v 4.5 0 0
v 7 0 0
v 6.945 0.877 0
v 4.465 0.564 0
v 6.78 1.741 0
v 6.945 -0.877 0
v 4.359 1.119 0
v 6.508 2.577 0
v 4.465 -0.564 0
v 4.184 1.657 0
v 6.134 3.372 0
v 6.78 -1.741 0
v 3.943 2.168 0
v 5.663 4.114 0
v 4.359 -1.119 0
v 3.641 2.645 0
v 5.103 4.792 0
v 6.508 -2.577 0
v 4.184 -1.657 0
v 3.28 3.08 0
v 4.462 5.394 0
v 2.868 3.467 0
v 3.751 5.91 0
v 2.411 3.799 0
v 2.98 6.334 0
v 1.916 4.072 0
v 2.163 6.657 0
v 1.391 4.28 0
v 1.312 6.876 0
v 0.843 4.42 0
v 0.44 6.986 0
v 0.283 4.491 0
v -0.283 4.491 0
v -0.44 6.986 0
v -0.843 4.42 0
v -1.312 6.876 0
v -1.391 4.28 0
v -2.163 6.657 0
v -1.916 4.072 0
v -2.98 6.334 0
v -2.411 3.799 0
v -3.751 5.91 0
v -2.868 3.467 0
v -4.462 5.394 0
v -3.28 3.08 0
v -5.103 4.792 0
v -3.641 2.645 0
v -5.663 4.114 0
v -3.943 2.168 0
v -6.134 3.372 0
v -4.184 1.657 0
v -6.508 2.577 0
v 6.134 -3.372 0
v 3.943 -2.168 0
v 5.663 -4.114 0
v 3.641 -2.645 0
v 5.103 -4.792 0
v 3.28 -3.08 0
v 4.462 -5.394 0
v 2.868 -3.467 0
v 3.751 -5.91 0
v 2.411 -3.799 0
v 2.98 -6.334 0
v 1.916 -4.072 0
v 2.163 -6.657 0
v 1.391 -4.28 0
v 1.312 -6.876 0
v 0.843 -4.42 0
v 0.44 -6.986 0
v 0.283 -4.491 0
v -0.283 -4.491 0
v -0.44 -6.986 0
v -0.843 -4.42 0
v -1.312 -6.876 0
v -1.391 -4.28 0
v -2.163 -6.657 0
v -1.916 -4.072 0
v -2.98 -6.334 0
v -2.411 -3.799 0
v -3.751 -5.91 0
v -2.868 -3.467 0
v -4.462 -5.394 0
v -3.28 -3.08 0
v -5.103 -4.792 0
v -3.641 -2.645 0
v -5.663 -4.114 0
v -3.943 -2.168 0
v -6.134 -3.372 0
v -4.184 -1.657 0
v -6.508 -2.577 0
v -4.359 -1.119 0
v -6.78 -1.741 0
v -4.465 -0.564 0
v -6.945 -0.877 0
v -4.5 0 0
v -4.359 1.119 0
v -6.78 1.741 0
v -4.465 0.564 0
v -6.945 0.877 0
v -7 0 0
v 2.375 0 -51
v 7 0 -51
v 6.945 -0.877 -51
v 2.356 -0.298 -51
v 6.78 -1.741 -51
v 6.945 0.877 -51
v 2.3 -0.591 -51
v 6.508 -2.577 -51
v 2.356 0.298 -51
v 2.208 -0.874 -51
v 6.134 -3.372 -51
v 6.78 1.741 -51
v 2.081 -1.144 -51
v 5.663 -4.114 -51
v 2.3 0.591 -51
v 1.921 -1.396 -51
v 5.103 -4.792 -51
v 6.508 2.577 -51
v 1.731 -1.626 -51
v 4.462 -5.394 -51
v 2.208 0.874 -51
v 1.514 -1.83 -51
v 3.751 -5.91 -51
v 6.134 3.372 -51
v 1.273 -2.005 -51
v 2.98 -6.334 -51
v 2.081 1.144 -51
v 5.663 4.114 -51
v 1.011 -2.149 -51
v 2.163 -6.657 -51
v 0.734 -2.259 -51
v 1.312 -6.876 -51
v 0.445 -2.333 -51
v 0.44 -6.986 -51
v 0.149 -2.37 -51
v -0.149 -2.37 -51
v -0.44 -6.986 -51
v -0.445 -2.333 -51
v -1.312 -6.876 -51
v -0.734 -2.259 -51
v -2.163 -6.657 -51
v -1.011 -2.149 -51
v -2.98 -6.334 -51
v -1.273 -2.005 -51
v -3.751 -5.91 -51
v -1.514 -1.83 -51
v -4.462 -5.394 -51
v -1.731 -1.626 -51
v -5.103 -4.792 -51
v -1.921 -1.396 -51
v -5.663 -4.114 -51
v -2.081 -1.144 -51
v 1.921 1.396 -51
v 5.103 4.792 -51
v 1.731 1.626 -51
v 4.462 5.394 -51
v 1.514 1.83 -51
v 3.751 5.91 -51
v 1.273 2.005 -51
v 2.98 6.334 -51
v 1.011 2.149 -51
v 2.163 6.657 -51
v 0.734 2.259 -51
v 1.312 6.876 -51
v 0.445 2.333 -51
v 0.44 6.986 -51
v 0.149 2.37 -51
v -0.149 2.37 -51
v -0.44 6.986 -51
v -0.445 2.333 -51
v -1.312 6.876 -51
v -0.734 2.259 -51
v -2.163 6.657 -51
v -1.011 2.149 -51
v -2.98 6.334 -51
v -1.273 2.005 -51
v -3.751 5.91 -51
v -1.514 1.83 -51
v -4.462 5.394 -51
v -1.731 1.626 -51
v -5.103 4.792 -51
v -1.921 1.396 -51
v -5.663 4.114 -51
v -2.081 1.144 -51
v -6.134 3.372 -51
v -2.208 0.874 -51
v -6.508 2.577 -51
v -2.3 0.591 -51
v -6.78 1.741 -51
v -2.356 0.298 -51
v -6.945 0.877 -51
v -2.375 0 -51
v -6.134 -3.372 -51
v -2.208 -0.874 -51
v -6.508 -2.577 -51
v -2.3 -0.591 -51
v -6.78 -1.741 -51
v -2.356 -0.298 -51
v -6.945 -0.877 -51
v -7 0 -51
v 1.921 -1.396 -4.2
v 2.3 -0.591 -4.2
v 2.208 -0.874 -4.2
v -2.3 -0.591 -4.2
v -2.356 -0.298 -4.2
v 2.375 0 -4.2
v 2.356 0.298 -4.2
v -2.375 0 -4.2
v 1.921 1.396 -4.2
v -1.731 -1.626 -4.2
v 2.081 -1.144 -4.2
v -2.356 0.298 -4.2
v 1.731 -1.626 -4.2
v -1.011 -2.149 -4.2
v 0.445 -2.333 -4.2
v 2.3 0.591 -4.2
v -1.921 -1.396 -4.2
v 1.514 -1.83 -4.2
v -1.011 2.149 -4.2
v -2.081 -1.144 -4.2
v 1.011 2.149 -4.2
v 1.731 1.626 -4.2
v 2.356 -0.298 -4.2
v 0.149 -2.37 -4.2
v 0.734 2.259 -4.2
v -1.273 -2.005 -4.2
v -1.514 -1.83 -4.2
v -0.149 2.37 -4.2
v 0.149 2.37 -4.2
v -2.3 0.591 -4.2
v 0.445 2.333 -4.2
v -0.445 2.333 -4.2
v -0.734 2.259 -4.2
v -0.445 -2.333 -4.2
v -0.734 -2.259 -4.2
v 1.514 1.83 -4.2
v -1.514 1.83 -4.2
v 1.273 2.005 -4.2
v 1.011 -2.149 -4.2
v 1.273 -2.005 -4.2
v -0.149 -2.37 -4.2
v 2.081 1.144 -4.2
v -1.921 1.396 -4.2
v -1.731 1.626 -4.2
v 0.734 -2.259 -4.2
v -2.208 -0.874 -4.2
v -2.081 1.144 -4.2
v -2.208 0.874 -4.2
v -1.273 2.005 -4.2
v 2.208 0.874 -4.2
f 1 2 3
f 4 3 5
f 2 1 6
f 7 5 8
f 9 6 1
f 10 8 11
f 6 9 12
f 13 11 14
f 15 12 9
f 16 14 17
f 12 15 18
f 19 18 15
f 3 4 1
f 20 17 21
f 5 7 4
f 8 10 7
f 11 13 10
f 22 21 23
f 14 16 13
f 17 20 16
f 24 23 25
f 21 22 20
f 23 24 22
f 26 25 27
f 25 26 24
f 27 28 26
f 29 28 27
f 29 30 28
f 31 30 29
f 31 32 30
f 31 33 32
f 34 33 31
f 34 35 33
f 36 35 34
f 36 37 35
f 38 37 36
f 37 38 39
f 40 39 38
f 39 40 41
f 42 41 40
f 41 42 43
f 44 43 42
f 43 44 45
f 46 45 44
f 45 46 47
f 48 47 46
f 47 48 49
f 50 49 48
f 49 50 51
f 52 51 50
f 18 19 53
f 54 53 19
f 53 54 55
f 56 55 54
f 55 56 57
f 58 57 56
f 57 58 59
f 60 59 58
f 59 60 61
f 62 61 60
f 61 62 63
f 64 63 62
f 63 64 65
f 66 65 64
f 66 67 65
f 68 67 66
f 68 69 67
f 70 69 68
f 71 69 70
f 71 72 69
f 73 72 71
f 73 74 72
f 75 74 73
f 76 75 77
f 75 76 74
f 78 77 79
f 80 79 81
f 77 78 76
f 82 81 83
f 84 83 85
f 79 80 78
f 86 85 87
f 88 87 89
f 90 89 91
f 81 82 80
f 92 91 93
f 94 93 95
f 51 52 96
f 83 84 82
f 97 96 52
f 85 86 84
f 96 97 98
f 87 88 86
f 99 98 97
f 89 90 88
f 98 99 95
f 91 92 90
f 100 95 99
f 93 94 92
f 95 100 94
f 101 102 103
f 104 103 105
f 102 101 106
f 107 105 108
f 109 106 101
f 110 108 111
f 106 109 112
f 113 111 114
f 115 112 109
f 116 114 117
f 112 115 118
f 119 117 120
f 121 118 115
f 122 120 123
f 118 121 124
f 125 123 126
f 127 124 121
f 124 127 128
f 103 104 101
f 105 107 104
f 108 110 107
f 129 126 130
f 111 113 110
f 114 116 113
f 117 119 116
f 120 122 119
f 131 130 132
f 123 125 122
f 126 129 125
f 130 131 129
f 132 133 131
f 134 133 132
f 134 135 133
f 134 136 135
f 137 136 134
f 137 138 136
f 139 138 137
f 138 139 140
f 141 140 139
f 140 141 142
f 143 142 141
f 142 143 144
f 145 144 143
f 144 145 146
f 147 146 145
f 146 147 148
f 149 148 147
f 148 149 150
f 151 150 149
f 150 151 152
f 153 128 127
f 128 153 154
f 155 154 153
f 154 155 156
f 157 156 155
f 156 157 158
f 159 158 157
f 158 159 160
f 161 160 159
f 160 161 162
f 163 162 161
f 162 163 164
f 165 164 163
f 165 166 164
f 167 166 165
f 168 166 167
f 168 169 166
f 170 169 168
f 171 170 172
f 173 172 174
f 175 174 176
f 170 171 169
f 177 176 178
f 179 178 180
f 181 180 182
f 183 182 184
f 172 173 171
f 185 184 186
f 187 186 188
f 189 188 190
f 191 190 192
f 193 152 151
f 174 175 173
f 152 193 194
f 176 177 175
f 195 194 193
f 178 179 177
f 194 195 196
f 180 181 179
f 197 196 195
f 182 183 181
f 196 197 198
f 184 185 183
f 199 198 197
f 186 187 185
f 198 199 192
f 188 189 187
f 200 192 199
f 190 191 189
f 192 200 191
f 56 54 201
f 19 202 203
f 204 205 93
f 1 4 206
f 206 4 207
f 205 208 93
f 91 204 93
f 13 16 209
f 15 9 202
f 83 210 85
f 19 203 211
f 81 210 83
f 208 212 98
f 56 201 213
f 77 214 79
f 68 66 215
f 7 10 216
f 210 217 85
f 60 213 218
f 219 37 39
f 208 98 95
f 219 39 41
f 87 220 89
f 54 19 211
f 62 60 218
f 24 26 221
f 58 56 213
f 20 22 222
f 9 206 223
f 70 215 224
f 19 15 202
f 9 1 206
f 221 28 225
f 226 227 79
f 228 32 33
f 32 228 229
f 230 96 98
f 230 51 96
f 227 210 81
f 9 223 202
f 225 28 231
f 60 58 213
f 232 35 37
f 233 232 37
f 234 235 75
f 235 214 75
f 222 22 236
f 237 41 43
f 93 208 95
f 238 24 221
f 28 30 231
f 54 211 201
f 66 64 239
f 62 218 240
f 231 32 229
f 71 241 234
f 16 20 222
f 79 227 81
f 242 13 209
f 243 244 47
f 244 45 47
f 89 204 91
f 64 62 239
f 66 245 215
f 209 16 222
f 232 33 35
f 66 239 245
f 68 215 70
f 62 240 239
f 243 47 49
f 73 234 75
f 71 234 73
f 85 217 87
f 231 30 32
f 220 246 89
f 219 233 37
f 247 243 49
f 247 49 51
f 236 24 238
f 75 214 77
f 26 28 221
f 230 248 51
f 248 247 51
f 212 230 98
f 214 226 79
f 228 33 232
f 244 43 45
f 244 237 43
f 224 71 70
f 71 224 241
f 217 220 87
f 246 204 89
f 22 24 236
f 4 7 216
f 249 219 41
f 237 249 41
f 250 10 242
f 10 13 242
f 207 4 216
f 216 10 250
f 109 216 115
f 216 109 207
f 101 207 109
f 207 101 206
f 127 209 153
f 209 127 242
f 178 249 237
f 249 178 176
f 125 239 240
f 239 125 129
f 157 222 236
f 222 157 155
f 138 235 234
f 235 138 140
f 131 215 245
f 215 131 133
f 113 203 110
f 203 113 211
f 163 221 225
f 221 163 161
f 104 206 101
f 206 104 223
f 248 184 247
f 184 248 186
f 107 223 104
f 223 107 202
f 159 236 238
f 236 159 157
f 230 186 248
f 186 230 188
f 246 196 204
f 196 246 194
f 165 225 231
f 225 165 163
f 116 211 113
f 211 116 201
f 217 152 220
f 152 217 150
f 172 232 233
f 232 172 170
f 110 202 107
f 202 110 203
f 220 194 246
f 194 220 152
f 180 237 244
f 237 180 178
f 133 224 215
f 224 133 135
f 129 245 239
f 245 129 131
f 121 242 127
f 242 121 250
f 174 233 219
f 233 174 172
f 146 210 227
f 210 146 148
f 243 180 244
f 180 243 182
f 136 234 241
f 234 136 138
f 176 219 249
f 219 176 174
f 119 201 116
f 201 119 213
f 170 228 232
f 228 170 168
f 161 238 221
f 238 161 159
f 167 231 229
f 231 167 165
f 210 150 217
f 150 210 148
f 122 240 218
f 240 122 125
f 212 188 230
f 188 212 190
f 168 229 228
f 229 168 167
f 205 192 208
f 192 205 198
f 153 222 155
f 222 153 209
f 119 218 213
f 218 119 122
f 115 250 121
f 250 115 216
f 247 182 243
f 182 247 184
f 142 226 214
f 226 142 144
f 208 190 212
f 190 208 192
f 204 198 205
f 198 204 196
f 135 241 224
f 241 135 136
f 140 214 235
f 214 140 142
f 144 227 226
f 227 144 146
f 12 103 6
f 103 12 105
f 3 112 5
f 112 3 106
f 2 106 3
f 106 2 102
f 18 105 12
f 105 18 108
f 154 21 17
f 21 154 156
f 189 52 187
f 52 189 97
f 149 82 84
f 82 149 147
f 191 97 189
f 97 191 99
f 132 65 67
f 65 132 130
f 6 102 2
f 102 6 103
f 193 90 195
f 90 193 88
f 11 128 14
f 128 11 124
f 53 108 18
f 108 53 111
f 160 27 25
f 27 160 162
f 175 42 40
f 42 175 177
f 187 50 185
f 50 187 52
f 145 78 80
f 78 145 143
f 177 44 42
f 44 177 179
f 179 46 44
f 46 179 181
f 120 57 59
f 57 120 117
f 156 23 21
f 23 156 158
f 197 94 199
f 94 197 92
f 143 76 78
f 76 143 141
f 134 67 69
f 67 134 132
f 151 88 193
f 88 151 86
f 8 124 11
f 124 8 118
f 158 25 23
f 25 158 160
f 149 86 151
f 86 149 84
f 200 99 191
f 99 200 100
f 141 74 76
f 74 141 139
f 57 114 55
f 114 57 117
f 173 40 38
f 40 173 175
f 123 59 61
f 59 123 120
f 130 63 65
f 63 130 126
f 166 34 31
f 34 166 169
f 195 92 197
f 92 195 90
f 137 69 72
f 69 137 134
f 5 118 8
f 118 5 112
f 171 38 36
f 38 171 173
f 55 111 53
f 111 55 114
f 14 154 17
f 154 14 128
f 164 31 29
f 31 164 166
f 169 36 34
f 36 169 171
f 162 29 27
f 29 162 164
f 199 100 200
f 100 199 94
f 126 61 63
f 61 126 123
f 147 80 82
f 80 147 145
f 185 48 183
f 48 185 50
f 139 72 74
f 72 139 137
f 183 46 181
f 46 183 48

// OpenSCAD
$fn = 50;


difference() {
	union() {
		translate(v = [0, 0, -51.0000000000]) {
			cylinder(h = 51, r = 7.0000000000);
		}
		cylinder(h = 0, r = 16.0000000000);
	}
	union() {
		translate(v = [0, 0, 0]) {
			rotate(a = [0, 0, 0]) {
				difference() {
					union() {
						#translate(v = [0, 0, -51.0000000000]) {
							cylinder(h = 51, r = 2.2500000000);
						}
						#translate(v = [0, 0, -4.2000000000]) {
							cylinder(h = 4.2000000000, r = 7.0000000000, r1 = 2.3750000000, r2 = 4.5000000000);
						}
						#translate(v = [0, 0, -51.0000000000]) {
							cylinder(h = 51, r = 2.3750000000);
						}
						#translate(v = [0, 0, -51.0000000000]) {
							cylinder(h = 51, r = 2.2500000000);
						}
					}
					union();
				}
			}
		}
	}
}
